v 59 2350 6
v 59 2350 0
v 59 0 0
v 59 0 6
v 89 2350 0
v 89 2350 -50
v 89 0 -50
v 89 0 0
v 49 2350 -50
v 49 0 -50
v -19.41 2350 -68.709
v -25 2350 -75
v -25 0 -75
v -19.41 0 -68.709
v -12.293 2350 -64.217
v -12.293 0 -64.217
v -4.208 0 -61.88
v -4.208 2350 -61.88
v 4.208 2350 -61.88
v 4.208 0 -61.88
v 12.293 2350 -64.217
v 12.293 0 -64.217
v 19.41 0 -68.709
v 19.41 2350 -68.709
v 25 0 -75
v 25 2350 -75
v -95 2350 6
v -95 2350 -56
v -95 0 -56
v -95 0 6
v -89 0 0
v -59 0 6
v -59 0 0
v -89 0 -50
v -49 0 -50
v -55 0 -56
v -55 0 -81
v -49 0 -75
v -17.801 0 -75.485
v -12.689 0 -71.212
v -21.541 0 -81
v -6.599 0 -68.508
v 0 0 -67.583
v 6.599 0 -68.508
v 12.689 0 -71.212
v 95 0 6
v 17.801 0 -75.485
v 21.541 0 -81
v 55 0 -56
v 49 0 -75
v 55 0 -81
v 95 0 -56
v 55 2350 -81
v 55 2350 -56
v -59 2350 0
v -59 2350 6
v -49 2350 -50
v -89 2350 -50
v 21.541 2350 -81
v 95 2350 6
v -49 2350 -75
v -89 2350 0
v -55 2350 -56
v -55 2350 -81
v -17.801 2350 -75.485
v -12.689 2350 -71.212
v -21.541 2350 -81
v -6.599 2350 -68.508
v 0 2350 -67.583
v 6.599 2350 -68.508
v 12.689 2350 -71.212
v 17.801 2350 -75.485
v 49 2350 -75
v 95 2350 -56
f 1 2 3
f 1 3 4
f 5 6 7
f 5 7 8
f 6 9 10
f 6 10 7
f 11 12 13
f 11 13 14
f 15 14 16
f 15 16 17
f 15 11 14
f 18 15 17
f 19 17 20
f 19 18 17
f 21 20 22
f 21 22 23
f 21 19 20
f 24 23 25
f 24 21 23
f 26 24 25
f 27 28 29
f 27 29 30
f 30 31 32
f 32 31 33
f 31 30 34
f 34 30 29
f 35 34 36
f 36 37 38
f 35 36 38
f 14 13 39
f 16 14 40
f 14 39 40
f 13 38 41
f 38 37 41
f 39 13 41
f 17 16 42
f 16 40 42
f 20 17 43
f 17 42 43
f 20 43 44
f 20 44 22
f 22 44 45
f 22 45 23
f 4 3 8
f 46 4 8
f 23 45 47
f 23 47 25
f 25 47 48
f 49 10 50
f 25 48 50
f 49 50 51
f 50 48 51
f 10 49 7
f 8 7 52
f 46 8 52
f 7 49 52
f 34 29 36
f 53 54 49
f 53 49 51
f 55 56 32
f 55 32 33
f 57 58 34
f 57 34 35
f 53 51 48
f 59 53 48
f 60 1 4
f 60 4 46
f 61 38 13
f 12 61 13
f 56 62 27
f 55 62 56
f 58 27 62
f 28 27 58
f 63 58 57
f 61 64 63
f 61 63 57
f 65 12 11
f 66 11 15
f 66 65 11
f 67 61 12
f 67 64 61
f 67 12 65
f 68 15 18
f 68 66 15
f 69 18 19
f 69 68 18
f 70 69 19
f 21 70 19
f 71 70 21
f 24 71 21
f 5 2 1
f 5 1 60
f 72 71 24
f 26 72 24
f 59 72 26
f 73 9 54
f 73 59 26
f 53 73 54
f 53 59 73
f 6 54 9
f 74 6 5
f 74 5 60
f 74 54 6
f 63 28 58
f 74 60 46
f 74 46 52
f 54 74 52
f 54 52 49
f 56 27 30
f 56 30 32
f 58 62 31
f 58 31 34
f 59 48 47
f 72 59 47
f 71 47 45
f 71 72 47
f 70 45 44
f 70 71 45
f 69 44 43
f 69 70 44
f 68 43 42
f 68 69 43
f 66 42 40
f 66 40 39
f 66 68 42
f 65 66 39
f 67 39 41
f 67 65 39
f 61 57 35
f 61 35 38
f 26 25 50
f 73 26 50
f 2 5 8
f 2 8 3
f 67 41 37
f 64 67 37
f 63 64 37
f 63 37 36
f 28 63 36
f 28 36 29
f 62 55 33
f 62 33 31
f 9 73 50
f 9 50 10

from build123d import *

# Parameters (mm, degrees)
BOSS_EXTRUDE1_DEPTH = 2350


with BuildPart() as part:
    # Sketch1 → Boss-Extrude1 (new body)
    with BuildSketch(Plane(origin=(0, 2350, 0), x_dir=(1, 0, 0), z_dir=(0, 1, 0))):
        with BuildLine():
            Line((25, 75), (49, 75))
            Line((49, 75), (49, 50))
            Line((49, 50), (89, 50))
            Line((89, 50), (89, 0))
            Line((89, 0), (59, 0))
            Line((59, 0), (59, -6))
            Line((59, -6), (95, -6))
            Line((95, -6), (95, 56))
            Line((95, 56), (55, 56))
            Line((55, 56), (55, 81))
            Line((55, 81), (21.540600907, 81))
            ThreePointArc((21.540600907, 81), (0, 67.583123952), (-21.540600907, 81))
            Line((-21.540600907, 81), (-55, 81))
            Line((-55, 81), (-55, 56))
            Line((-55, 56), (-95, 56))
            Line((-95, 56), (-95, -6))
            Line((-95, -6), (-59, -6))
            Line((-59, -6), (-59, 0))
            Line((-59, 0), (-89, 0))
            Line((-89, 0), (-89, 50))
            Line((-89, 50), (-49, 50))
            Line((-49, 50), (-49, 75))
            Line((-49, 75), (-25, 75))
            ThreePointArc((-25, 75), (0, 61.583123952), (25, 75))
        make_face()
    extrude(amount=-BOSS_EXTRUDE1_DEPTH)


solid = part.part
